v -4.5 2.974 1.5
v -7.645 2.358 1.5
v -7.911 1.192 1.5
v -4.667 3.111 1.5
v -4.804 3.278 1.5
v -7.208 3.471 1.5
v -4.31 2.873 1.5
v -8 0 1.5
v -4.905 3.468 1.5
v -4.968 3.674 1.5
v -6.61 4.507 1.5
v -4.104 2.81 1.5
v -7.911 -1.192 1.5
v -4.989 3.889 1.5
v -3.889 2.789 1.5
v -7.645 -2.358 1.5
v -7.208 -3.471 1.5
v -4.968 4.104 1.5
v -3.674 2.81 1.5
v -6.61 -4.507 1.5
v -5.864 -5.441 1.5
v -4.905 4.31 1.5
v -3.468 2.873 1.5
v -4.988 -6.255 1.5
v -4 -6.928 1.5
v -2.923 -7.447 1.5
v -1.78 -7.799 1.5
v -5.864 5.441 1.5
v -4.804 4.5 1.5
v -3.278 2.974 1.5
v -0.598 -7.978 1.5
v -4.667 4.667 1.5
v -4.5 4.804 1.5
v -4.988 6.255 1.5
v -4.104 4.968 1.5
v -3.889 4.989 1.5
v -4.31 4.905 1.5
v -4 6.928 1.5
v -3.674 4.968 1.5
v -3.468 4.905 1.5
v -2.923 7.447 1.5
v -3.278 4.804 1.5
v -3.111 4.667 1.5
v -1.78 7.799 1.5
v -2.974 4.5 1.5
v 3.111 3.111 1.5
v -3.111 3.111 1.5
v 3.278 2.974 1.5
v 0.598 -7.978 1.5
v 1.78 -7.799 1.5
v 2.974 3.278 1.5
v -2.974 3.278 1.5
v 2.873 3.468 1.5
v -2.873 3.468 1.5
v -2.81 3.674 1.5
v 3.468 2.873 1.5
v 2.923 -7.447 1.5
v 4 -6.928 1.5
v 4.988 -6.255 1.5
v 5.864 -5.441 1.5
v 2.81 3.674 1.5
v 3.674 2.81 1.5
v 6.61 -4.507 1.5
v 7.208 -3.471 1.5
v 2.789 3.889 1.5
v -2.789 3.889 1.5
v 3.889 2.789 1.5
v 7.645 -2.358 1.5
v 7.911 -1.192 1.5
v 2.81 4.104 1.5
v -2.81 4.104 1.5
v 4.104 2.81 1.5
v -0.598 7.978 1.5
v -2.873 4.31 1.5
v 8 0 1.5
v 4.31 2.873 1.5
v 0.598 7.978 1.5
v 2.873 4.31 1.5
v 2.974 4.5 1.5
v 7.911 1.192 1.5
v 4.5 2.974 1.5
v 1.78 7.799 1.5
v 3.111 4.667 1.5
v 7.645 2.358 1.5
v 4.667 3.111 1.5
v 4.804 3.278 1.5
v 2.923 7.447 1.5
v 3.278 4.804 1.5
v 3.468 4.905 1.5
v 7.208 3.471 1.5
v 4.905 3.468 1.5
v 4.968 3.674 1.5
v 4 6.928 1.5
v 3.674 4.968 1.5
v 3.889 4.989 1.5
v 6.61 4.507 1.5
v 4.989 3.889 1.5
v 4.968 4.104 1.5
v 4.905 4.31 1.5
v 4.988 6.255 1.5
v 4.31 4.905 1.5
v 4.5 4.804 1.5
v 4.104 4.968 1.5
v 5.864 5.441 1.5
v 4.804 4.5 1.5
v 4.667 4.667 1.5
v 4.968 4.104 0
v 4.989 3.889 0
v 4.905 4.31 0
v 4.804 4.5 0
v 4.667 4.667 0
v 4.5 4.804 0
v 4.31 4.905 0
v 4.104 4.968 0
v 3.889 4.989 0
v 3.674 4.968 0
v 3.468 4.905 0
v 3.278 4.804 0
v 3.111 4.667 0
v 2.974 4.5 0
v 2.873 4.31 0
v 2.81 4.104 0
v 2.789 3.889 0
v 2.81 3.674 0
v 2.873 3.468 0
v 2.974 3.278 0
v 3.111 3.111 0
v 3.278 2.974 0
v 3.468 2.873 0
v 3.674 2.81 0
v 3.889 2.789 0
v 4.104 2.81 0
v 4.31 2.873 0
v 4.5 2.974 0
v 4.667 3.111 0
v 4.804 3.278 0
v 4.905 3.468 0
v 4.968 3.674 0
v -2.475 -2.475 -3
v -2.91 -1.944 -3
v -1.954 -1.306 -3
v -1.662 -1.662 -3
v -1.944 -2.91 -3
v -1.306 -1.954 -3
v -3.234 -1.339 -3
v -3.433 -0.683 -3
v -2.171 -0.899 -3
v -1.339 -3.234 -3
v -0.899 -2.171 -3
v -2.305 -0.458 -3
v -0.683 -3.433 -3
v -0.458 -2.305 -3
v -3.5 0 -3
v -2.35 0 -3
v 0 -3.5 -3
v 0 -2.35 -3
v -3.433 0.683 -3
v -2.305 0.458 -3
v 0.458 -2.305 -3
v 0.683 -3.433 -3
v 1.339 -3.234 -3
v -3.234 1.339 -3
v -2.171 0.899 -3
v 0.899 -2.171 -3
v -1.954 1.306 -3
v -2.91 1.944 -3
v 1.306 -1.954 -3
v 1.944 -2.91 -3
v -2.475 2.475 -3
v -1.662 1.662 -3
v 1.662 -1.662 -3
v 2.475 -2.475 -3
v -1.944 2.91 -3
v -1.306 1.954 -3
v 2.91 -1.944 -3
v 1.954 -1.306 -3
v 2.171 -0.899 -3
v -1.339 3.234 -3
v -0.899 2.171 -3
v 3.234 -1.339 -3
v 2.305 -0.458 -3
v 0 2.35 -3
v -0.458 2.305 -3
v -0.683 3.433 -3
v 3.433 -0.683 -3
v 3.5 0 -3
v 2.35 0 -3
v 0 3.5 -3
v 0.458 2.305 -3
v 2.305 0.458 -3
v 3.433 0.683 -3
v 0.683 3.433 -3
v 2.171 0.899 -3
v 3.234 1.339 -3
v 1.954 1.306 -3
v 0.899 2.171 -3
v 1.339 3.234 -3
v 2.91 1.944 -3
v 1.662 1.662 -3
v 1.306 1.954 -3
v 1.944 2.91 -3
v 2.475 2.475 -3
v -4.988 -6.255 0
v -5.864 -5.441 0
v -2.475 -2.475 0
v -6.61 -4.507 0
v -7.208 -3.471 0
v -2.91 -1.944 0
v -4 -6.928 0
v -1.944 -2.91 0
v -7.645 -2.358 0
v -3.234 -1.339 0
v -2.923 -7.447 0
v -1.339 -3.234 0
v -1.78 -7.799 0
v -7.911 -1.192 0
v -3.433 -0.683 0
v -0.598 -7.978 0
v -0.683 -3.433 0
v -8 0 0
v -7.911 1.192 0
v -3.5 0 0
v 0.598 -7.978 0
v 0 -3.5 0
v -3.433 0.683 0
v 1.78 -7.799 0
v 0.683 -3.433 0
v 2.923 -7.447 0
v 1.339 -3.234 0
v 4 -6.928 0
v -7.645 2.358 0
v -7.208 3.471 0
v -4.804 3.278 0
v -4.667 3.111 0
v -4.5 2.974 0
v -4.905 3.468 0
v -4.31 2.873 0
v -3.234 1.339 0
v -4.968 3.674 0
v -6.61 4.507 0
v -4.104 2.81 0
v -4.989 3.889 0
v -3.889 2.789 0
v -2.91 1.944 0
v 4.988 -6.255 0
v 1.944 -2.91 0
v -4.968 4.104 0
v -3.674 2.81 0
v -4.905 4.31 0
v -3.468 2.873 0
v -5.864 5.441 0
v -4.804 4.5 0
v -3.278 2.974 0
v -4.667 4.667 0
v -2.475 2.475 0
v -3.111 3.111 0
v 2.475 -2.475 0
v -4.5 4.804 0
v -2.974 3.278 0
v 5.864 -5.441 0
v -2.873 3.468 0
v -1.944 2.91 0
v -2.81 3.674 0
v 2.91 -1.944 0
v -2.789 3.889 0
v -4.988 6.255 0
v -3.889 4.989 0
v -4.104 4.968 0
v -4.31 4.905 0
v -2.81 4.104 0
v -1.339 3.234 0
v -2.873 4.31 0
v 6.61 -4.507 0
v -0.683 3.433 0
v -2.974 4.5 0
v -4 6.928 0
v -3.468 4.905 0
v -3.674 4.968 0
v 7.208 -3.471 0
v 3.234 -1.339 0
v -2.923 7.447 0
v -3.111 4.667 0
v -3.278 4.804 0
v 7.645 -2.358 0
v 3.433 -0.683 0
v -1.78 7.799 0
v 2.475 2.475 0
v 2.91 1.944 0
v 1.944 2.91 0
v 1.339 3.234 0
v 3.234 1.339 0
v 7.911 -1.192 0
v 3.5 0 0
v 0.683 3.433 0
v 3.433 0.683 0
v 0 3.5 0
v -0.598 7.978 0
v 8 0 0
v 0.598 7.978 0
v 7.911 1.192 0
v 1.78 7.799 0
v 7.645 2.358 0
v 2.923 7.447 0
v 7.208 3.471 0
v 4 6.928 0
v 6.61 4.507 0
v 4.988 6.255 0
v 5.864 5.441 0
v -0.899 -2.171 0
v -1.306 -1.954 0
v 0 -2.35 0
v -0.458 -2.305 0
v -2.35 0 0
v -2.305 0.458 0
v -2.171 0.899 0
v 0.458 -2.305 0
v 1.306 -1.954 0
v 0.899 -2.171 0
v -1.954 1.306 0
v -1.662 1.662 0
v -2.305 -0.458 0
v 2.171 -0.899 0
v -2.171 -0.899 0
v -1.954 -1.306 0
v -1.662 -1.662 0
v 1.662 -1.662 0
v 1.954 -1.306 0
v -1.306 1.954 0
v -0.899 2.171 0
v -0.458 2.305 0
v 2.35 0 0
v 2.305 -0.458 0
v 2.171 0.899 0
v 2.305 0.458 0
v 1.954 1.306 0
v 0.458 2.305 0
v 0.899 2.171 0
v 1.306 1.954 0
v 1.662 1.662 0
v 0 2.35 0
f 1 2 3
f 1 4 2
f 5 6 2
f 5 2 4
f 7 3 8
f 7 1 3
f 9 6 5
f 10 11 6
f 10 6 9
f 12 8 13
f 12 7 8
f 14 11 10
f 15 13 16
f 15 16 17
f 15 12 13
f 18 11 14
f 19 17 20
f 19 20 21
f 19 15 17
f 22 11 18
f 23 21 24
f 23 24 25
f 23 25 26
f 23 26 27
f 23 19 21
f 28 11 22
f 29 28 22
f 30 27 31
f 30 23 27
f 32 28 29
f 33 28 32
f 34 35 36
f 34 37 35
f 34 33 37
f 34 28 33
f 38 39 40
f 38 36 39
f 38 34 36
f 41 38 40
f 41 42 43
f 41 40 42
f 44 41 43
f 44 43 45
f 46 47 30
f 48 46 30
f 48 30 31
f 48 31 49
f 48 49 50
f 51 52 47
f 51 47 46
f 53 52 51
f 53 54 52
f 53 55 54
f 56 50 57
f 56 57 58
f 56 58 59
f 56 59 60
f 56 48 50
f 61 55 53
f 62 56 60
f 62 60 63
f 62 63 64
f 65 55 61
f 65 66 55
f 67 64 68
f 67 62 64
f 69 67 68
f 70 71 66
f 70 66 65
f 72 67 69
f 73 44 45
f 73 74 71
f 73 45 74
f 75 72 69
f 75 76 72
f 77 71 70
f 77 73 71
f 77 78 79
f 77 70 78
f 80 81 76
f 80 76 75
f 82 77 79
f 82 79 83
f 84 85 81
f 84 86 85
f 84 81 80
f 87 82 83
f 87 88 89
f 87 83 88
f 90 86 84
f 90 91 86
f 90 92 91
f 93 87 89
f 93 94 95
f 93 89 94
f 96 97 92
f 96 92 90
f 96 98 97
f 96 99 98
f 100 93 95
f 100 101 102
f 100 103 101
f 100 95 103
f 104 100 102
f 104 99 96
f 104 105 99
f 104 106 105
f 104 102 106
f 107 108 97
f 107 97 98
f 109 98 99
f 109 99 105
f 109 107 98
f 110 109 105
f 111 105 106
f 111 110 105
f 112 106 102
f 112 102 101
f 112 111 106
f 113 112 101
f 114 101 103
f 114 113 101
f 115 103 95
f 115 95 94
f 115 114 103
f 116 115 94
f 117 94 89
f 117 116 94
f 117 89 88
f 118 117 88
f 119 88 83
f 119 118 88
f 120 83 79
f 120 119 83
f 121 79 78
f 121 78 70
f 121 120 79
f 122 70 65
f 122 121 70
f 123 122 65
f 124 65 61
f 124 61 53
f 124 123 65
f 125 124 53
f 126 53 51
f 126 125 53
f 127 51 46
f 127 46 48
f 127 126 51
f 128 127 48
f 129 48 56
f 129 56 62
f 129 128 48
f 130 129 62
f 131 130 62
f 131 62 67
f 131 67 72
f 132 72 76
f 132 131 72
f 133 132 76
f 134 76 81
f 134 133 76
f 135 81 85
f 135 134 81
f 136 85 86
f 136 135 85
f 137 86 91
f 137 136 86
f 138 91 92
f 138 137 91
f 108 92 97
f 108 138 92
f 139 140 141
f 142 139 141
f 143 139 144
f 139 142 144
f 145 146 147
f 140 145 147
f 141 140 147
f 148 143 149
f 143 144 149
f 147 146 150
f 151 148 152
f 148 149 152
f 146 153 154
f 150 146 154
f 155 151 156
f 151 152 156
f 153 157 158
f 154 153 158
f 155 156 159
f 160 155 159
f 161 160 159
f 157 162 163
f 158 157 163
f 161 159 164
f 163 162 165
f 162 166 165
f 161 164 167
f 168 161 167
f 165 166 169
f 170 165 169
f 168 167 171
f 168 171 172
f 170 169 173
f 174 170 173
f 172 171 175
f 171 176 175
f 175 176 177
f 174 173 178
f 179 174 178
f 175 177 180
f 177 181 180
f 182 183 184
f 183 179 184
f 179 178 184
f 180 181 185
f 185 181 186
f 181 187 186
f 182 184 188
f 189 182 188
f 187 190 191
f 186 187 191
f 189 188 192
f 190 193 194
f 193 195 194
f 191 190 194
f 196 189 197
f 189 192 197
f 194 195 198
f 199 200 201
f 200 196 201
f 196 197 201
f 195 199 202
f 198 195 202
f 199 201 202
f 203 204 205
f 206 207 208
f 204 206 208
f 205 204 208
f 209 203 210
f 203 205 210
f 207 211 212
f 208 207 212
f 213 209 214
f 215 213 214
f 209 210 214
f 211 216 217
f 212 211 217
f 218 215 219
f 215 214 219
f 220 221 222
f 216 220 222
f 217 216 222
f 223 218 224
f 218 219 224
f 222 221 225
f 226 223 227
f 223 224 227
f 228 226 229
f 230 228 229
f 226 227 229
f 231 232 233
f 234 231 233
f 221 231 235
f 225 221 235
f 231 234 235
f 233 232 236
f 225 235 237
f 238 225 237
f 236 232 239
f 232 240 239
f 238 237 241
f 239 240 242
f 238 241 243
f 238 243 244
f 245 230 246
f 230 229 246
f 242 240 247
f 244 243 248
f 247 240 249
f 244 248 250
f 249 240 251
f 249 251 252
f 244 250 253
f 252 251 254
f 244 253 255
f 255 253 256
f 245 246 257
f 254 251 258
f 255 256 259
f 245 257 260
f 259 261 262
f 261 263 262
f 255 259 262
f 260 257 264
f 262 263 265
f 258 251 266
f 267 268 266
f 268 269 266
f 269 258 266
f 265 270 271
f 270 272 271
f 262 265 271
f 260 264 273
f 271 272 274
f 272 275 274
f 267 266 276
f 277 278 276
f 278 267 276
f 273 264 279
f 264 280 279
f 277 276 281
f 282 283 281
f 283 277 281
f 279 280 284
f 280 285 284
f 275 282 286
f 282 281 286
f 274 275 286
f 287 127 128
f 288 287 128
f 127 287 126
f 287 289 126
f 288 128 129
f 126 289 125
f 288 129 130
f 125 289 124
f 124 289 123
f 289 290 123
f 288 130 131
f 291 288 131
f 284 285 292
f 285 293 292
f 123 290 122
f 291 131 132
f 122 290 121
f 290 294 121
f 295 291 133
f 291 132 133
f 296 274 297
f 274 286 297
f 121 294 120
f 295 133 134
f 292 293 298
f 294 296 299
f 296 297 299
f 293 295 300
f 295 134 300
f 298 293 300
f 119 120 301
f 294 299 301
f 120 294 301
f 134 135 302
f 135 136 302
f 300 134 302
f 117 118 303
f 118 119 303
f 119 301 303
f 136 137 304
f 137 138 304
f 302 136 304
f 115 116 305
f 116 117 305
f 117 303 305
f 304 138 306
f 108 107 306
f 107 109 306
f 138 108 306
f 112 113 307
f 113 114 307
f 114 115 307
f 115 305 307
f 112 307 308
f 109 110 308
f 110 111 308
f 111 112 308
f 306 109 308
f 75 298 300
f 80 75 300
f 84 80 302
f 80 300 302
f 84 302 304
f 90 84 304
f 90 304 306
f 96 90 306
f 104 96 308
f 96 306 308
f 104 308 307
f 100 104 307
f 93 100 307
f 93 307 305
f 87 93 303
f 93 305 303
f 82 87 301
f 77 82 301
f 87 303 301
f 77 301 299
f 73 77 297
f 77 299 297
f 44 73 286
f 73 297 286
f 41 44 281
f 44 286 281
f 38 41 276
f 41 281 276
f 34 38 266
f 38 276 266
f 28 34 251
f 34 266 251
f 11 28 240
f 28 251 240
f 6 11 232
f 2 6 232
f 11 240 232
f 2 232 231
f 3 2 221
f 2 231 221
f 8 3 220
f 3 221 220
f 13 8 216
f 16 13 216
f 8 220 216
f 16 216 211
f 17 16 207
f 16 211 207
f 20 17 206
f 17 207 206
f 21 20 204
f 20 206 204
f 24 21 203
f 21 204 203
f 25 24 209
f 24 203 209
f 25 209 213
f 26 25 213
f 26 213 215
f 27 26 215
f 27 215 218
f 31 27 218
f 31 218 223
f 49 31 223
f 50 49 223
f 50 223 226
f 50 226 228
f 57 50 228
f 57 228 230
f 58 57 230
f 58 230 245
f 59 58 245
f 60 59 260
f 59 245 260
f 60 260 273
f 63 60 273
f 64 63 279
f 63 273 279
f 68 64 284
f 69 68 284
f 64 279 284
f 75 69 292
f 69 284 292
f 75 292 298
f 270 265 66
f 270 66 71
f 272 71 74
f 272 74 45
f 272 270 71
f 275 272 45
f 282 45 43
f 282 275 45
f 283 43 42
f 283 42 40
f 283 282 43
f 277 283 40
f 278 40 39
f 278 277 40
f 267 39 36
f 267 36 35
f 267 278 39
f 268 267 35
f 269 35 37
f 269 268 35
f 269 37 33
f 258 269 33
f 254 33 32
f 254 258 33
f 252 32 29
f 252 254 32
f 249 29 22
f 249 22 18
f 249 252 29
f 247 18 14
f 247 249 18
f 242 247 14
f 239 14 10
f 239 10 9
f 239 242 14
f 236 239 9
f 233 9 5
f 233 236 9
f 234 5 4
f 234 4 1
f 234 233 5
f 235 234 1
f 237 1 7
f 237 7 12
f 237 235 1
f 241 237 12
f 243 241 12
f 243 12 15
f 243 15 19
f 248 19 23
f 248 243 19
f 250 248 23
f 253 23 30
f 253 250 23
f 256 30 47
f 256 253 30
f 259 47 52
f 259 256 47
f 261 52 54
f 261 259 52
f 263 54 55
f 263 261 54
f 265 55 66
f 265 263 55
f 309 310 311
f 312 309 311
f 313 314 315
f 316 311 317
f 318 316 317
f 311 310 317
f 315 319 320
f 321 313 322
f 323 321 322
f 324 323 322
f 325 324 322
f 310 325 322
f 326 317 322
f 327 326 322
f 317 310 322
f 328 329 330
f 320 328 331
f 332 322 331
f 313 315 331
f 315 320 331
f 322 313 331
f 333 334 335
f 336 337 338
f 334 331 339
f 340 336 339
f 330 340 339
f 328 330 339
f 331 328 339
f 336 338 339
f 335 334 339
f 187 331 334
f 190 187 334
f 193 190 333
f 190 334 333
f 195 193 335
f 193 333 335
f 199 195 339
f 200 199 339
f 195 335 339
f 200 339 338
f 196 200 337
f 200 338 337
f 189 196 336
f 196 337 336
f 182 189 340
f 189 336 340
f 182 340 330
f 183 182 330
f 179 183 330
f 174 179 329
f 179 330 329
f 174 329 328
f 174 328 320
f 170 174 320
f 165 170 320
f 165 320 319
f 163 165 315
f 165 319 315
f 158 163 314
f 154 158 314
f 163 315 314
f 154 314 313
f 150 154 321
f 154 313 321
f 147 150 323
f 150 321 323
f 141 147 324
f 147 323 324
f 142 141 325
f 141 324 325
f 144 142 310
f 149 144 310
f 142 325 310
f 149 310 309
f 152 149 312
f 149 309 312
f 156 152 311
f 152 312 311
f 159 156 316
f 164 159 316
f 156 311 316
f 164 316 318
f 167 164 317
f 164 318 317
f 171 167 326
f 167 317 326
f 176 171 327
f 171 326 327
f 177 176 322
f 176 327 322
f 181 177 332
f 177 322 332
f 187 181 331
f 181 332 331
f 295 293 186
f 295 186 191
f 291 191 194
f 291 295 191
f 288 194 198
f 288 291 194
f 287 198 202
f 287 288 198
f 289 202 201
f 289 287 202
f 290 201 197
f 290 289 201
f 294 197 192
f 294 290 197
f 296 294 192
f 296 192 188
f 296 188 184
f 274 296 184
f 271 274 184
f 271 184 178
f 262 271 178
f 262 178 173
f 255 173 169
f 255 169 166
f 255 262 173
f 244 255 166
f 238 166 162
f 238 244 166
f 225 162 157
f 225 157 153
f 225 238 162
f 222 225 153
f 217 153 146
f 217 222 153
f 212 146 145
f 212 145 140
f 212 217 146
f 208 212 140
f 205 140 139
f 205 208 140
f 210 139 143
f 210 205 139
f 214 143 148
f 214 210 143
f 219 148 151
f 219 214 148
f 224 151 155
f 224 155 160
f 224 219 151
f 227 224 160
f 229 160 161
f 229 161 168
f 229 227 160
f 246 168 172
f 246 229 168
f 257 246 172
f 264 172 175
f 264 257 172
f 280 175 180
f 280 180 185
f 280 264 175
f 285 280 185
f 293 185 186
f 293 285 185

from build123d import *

# Parameters (mm, degrees)
ESQUISSE1_R              = 8
ESQUISSE1_R_2            = 1.1
DISQUE_O16_DEPTH         = 1.5
ESQUISSE2_R              = 3.5
ESQUISSE2_R_2            = 2.35
MOYEU_CANNELE_SG90_DEPTH = 3


with BuildPart() as part:
    # Esquisse1 → Disque O16 (new body)
    with BuildSketch(Plane.XY):
        Circle(ESQUISSE1_R)
        with Locations((3.889087297, 3.889087297)):
            Circle(ESQUISSE1_R_2, mode=Mode.SUBTRACT)
        with Locations((-3.889087297, 3.889087297)):
            Circle(ESQUISSE1_R_2, mode=Mode.SUBTRACT)
    extrude(amount=DISQUE_O16_DEPTH)

    # Esquisse2 → Moyeu cannele SG90 (add)
    with BuildSketch(Plane.XY):
        Circle(ESQUISSE2_R)
        Circle(ESQUISSE2_R_2, mode=Mode.SUBTRACT)
    extrude(amount=-MOYEU_CANNELE_SG90_DEPTH)


solid = part.part
